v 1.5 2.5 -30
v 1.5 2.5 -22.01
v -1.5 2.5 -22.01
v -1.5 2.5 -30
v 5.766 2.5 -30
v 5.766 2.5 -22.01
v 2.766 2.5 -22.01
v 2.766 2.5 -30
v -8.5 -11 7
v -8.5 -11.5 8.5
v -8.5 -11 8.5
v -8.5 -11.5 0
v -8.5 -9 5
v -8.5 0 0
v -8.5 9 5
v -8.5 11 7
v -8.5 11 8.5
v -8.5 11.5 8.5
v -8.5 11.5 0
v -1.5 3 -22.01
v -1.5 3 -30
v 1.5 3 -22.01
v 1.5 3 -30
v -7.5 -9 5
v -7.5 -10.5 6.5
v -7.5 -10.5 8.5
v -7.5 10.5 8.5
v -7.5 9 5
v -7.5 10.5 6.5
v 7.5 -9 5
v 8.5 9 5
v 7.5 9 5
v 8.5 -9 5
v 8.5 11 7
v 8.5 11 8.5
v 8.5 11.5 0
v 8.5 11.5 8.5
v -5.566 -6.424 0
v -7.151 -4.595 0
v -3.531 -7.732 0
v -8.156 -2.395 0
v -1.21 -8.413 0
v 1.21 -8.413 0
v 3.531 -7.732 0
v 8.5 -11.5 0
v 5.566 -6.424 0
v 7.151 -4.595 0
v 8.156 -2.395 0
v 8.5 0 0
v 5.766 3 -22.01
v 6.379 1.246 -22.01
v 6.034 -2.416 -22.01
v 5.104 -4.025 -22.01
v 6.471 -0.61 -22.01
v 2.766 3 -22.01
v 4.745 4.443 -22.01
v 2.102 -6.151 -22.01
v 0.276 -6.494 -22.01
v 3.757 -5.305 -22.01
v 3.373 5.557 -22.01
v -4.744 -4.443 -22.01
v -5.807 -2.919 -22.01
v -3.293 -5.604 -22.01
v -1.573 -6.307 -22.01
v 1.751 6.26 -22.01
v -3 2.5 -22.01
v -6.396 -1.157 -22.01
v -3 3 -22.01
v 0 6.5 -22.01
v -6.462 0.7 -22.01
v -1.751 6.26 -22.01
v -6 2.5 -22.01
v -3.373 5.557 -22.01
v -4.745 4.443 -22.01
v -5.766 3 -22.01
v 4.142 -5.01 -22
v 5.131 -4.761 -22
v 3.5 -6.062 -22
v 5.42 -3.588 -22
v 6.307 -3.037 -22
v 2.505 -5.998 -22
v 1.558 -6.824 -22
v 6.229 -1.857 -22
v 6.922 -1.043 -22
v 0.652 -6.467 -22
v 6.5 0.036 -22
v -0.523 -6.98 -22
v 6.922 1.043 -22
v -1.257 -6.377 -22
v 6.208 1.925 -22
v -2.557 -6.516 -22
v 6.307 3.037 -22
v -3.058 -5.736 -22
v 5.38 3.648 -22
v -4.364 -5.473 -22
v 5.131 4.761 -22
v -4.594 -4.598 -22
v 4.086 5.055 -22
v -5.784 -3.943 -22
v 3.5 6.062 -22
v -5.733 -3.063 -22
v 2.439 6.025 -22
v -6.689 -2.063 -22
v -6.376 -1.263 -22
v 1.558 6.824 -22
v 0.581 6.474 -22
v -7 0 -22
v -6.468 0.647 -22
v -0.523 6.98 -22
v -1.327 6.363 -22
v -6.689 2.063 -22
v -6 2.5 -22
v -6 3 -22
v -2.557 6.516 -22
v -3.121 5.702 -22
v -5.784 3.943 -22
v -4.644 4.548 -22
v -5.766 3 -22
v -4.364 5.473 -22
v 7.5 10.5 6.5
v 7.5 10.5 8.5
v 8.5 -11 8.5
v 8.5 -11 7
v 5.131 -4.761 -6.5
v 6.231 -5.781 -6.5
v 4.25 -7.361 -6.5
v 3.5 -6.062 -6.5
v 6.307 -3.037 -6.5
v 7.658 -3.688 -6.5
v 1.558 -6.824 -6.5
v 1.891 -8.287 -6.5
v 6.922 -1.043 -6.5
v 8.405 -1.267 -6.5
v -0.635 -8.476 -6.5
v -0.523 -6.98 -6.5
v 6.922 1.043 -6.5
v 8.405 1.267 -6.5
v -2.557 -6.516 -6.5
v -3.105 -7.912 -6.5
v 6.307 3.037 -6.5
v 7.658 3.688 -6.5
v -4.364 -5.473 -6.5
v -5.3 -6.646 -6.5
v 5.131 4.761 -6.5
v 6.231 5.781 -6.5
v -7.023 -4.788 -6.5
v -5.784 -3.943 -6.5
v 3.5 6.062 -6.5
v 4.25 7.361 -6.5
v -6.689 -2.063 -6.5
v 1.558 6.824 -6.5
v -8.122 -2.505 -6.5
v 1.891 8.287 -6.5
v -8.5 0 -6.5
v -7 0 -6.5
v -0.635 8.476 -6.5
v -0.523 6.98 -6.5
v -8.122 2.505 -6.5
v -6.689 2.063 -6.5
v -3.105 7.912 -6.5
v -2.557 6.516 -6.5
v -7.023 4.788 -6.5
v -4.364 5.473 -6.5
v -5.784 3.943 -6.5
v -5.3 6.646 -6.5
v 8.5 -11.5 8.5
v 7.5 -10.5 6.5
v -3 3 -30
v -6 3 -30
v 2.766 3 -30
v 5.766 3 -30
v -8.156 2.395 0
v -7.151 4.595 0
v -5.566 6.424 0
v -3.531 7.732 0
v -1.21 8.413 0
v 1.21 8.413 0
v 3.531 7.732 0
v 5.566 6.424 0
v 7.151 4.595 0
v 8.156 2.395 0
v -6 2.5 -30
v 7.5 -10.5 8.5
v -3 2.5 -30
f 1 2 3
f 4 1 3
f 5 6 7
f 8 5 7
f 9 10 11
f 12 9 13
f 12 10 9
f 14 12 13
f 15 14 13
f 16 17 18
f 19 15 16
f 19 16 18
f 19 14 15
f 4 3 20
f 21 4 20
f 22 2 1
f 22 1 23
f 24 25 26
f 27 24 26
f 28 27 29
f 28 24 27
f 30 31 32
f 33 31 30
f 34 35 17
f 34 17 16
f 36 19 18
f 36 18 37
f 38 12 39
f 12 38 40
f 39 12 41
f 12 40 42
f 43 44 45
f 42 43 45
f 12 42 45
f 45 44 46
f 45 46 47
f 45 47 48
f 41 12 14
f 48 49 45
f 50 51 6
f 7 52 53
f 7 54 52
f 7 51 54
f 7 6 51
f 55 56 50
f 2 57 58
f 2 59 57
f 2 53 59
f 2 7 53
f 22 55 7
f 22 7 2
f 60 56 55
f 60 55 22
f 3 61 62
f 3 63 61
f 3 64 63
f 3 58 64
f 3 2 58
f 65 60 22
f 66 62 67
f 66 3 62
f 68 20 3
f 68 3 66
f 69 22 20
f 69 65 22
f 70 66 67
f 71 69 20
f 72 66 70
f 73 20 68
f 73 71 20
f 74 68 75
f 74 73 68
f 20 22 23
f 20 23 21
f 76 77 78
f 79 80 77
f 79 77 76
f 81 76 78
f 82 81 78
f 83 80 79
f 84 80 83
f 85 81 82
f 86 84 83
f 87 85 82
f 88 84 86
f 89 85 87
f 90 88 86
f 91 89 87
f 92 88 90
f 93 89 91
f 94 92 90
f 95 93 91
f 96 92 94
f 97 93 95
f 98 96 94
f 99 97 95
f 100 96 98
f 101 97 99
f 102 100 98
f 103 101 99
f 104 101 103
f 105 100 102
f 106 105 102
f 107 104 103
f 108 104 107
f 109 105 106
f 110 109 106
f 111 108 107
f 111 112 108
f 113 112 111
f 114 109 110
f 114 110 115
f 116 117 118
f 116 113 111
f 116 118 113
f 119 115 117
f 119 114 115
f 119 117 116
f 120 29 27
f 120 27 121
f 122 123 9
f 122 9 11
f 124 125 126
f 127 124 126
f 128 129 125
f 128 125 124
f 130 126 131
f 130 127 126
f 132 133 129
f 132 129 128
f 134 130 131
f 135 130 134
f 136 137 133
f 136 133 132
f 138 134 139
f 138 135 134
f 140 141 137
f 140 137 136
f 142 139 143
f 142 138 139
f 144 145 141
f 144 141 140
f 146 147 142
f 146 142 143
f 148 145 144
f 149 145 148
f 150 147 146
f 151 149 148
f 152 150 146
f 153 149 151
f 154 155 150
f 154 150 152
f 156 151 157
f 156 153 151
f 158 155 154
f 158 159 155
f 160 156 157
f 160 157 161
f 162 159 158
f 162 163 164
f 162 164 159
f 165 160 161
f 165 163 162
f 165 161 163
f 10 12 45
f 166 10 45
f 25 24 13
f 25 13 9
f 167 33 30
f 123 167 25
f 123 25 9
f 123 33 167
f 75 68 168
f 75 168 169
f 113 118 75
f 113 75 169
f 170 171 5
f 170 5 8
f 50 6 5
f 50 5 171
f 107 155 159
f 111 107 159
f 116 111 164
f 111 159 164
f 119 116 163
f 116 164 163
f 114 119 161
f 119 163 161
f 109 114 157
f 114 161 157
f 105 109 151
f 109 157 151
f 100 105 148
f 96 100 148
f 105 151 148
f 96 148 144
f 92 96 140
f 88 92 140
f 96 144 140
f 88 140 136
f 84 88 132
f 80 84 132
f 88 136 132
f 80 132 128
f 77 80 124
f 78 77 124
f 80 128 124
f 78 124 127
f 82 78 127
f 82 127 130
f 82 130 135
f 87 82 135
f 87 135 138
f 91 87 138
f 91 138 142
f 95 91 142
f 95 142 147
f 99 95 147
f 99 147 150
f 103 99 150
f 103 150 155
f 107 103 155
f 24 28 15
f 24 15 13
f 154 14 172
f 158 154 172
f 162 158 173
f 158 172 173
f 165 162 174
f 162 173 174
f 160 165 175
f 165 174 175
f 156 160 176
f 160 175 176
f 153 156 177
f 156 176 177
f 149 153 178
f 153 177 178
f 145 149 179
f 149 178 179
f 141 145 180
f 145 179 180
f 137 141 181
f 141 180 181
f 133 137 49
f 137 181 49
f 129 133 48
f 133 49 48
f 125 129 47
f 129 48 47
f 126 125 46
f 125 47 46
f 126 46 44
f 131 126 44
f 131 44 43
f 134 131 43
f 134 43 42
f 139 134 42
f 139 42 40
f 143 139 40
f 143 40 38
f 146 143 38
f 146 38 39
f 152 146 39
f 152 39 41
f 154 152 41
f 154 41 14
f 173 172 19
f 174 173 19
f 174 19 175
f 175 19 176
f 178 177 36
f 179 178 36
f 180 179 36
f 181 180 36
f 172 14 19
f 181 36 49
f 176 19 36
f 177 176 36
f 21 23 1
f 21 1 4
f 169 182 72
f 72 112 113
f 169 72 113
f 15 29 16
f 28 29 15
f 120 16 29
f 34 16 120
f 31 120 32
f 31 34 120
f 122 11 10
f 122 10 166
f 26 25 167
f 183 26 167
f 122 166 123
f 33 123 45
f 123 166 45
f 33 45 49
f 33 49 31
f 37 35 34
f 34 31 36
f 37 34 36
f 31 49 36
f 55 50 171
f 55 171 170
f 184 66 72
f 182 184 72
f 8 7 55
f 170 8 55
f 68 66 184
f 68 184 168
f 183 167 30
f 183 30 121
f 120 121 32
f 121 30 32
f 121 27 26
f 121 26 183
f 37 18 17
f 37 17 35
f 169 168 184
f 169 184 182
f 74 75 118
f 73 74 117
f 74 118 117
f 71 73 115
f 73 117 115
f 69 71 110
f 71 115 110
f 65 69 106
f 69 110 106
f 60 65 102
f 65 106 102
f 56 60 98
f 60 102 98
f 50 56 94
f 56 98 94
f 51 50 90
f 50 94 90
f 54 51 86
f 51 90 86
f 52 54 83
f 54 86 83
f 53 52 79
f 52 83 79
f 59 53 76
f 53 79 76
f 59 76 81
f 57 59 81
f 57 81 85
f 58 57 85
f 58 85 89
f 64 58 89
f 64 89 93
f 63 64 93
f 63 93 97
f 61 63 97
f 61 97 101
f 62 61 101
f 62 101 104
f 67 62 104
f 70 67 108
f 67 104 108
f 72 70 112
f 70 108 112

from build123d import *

# Parameters (mm, degrees)
SKETCH_1_W          = 17
SKETCH_1_H          = 23
EXTRUDE_1_DEPTH     = 8.5
CUT_EXTRUDE_1_DEPTH = 20
SKETCH_3_W          = 15
SKETCH_3_H          = 21
EXTRUDE_2_DEPTH     = 3.5
SKETCH_4_R          = 8.5
EXTRUDE_3_DEPTH     = 6.5
SKETCH_5_R          = 7
EXTRUDE_4_DEPTH     = 22
SKETCH_6_W          = 3
SKETCH_6_H          = 0.5
EXTRUDE_5_DEPTH     = 8
SKETCH_7_R          = 6.5
EXTRUDE_6_DEPTH     = 0.01


with BuildPart() as part:
    # ｽｹｯﾁ1 → ﾎﾞｽ - 押し出し1 (new body)
    with BuildSketch(Plane.XY):
        Rectangle(SKETCH_1_W, SKETCH_1_H)
    extrude(amount=EXTRUDE_1_DEPTH)

    # ｽｹｯﾁ2 → ｶｯﾄ - 押し出し1 (cut)
    with BuildSketch(Plane(origin=(8.5, 0, 0), x_dir=(0, 0, -1), z_dir=(1, 0, 0))):
        Polygon((-8.5, 11), (-7, 11), (-5, 9), (-5, -9), (-7, -11), (-8.5, -11), align=None)
    extrude(amount=-CUT_EXTRUDE_1_DEPTH, mode=Mode.SUBTRACT)

    # ｽｹｯﾁ3 → ﾎﾞｽ - 押し出し2 (add)
    with BuildSketch(Plane.XY.offset(5)):
        Rectangle(SKETCH_3_W, SKETCH_3_H)
    extrude(amount=EXTRUDE_2_DEPTH)

    # ｽｹｯﾁ4 → ﾎﾞｽ - 押し出し3 (add)
    with BuildSketch(Plane(origin=(0, 0, 0), x_dir=(-1, 0, 0), z_dir=(0, 0, -1))):
        Circle(SKETCH_4_R)
    extrude(amount=EXTRUDE_3_DEPTH)

    # ｽｹｯﾁ5 → ﾎﾞｽ - 押し出し4 (add)
    with BuildSketch(Plane(origin=(0, 0, 0), x_dir=(-1, 0, 0), z_dir=(0, 0, -1))):
        Circle(SKETCH_5_R)
    extrude(amount=EXTRUDE_4_DEPTH)

    # ｽｹｯﾁ6 → ﾎﾞｽ - 押し出し5 (add)
    with BuildSketch(Plane(origin=(0, 0, -22), x_dir=(-1, 0, 0), z_dir=(0, 0, -1))):
        with Locations((-4.266281297, 2.75)):
            Rectangle(SKETCH_6_W, SKETCH_6_H)
        with Locations((0, 2.75)):
            Rectangle(SKETCH_6_W, SKETCH_6_H)
        with Locations((4.5, 2.75)):
            Rectangle(SKETCH_6_W, SKETCH_6_H)
    extrude(amount=EXTRUDE_5_DEPTH)

    # ｽｹｯﾁ7 → ﾎﾞｽ - 押し出し6 (add)
    with BuildSketch(Plane(origin=(0, 0, -22), x_dir=(-1, 0, 0), z_dir=(0, 0, -1))):
        Circle(SKETCH_7_R)
    extrude(amount=EXTRUDE_6_DEPTH)


solid = part.part
